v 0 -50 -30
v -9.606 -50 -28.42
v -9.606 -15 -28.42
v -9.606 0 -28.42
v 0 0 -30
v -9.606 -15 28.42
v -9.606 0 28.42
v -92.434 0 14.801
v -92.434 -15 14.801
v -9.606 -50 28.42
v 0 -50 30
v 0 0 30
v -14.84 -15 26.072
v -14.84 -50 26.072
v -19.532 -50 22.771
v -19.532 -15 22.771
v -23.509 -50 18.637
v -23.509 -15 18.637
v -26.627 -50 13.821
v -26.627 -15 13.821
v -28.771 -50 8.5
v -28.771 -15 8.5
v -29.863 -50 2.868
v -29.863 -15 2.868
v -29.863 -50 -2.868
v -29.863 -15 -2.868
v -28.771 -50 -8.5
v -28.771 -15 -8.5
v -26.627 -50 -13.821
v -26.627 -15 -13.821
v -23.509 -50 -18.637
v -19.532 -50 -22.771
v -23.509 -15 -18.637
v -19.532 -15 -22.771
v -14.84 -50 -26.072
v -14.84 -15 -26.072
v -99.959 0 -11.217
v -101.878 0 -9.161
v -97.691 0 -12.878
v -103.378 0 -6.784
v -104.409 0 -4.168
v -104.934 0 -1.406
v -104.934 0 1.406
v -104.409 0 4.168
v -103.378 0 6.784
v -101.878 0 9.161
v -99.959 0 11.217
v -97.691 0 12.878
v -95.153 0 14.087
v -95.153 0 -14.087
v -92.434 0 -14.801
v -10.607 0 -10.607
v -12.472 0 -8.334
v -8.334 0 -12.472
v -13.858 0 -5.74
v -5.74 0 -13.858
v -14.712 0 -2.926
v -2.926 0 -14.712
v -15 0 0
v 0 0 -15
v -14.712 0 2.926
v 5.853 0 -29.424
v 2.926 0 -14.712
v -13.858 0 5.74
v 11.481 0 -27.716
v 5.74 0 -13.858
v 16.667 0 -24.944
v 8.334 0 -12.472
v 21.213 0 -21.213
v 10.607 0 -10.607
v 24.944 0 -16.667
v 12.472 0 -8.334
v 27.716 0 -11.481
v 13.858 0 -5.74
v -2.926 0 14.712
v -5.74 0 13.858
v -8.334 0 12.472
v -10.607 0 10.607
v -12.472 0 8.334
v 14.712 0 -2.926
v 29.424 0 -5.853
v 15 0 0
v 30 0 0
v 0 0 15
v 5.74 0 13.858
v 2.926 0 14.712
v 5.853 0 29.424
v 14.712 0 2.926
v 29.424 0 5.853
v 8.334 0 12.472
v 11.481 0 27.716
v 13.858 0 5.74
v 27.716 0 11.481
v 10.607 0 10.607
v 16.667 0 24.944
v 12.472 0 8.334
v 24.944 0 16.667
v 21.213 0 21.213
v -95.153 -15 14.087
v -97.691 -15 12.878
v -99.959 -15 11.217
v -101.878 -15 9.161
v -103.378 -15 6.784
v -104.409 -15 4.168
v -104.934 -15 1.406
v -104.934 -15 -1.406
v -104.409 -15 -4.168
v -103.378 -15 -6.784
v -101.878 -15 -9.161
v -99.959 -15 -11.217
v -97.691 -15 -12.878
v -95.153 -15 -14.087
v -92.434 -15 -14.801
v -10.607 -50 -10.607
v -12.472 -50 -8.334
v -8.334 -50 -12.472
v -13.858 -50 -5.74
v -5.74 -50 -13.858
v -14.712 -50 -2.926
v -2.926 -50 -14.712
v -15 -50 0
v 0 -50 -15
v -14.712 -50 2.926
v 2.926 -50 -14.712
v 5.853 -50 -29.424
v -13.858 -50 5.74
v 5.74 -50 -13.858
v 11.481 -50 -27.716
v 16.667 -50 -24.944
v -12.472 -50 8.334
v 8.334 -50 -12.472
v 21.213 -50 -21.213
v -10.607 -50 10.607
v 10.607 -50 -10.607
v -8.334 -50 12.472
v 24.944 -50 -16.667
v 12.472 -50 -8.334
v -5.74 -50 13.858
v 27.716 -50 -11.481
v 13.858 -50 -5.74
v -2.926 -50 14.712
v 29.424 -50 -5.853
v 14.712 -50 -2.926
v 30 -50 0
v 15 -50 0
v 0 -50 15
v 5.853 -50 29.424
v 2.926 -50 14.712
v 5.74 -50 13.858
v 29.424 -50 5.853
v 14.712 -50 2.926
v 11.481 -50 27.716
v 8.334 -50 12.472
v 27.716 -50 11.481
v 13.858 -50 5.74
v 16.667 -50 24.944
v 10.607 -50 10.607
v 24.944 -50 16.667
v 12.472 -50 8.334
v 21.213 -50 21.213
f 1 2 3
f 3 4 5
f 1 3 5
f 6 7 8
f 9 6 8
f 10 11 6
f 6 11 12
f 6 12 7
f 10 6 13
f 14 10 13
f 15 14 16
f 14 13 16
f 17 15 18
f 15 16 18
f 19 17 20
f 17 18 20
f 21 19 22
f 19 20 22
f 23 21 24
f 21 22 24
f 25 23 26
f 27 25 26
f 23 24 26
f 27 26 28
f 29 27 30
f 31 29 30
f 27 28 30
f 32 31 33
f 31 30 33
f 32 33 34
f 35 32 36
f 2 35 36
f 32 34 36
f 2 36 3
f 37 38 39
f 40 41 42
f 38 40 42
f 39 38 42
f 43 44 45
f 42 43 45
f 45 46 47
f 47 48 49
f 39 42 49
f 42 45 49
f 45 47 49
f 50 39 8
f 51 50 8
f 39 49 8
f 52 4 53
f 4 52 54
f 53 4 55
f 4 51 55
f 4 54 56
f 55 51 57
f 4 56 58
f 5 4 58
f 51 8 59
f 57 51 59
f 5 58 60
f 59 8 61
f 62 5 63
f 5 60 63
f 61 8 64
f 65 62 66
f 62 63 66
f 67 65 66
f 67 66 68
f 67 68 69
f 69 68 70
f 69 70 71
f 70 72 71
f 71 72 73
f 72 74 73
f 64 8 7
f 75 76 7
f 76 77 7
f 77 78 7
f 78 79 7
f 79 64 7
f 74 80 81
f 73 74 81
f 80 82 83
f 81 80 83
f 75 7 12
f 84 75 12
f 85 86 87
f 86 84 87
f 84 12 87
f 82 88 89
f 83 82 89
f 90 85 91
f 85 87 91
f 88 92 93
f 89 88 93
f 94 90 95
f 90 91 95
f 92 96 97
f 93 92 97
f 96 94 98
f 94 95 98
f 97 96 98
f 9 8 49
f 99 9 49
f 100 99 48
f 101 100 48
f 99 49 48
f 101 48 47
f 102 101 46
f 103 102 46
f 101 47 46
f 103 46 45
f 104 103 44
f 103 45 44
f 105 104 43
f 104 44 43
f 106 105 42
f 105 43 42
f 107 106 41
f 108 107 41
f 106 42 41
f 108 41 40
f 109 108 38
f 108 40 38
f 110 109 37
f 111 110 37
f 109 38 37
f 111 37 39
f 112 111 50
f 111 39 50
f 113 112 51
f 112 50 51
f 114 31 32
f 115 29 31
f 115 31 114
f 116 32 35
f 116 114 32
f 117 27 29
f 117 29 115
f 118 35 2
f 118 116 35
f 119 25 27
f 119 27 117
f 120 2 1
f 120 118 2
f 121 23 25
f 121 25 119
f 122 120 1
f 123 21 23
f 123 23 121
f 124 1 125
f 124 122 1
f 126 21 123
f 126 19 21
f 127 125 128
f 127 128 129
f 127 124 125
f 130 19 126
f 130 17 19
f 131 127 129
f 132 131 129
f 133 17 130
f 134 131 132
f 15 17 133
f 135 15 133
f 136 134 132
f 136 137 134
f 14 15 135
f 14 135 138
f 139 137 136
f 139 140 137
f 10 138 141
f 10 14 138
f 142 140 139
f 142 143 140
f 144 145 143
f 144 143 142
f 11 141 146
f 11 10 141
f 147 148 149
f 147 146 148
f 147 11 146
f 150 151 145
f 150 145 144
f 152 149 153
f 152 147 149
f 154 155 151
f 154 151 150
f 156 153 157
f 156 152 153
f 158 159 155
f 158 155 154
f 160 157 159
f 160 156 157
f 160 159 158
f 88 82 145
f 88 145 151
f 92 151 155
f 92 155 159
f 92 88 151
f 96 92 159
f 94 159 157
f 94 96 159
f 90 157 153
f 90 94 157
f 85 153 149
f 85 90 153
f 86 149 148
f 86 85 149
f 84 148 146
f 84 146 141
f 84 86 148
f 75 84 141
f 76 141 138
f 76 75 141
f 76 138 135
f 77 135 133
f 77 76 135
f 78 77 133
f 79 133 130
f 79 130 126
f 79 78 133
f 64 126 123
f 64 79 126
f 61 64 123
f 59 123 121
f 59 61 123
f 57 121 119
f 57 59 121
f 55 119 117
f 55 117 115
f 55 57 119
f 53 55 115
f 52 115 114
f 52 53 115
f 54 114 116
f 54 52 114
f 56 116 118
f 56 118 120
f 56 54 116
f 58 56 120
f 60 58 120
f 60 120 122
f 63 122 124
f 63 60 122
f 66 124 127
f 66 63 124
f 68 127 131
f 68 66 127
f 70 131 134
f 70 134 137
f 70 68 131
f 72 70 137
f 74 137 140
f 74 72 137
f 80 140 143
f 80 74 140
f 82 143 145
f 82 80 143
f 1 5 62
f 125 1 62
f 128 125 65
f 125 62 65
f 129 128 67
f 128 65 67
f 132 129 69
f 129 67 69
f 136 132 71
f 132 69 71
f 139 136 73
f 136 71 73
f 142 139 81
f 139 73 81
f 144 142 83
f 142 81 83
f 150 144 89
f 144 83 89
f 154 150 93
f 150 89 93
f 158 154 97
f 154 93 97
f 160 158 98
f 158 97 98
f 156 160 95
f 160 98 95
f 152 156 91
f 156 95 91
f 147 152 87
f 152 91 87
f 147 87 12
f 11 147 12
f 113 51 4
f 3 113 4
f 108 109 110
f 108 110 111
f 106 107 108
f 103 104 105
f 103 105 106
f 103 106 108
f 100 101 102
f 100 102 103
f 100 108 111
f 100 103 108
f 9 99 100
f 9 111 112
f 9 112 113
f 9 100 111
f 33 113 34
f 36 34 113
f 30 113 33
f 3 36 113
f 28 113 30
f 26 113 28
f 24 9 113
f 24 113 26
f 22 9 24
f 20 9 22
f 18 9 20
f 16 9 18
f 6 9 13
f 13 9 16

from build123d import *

# Parameters (mm, degrees)
F0_R     = 15
F1_DEPTH = 50
F2_DEPTH = 15


with BuildPart() as f1:
    # F0 (on Front) → F1 (new body)
    with BuildSketch(Plane.XZ):
        with BuildLine():
            ThreePointArc((0, -30), (21.2132034356, -21.2132034356), (30, 0))
            ThreePointArc((30, 0), (21.2132034356, 21.2132034356), (0, 30))
            Line((0, 30), (-9.6060024019, 28.4204981986))
            ThreePointArc((-9.6060024019, 28.4204981986), (-30, 0), (-9.6060024019, -28.4204981986))
            Line((-9.6060024019, -28.4204981986), (0, -30))
        make_face()
        Circle(F0_R, mode=Mode.SUBTRACT)
    extrude(amount=F1_DEPTH)

    # F0 (on Front) → F2 (join)
    with BuildSketch(Plane.XZ):
        with BuildLine():
            ThreePointArc((-9.6060024019, -28.4204981986), (-30, 0), (-9.6060024019, 28.4204981986))
            Line((-9.6060024019, 28.4204981986), (-92.4337484988, 14.8012454964))
            ThreePointArc((-92.4337484988, 14.8012454964), (-80.2919164477, 11.4347327796), (-75, 0))
            ThreePointArc((-75, 0), (-80.2919164477, -11.4347327796), (-92.4337484988, -14.8012454964))
            Line((-92.4337484988, -14.8012454964), (-9.6060024019, -28.4204981986))
        make_face()
        with BuildLine():
            ThreePointArc((-75, 0), (-80.2919164477, 11.4347327796), (-92.4337484988, 14.8012454964))
            ThreePointArc((-92.4337484988, 14.8012454964), (-105, 0), (-92.4337484988, -14.8012454964))
            ThreePointArc((-92.4337484988, -14.8012454964), (-80.2919164477, -11.4347327796), (-75, 0))
        make_face()
    extrude(amount=F2_DEPTH)


solid = f1.part
